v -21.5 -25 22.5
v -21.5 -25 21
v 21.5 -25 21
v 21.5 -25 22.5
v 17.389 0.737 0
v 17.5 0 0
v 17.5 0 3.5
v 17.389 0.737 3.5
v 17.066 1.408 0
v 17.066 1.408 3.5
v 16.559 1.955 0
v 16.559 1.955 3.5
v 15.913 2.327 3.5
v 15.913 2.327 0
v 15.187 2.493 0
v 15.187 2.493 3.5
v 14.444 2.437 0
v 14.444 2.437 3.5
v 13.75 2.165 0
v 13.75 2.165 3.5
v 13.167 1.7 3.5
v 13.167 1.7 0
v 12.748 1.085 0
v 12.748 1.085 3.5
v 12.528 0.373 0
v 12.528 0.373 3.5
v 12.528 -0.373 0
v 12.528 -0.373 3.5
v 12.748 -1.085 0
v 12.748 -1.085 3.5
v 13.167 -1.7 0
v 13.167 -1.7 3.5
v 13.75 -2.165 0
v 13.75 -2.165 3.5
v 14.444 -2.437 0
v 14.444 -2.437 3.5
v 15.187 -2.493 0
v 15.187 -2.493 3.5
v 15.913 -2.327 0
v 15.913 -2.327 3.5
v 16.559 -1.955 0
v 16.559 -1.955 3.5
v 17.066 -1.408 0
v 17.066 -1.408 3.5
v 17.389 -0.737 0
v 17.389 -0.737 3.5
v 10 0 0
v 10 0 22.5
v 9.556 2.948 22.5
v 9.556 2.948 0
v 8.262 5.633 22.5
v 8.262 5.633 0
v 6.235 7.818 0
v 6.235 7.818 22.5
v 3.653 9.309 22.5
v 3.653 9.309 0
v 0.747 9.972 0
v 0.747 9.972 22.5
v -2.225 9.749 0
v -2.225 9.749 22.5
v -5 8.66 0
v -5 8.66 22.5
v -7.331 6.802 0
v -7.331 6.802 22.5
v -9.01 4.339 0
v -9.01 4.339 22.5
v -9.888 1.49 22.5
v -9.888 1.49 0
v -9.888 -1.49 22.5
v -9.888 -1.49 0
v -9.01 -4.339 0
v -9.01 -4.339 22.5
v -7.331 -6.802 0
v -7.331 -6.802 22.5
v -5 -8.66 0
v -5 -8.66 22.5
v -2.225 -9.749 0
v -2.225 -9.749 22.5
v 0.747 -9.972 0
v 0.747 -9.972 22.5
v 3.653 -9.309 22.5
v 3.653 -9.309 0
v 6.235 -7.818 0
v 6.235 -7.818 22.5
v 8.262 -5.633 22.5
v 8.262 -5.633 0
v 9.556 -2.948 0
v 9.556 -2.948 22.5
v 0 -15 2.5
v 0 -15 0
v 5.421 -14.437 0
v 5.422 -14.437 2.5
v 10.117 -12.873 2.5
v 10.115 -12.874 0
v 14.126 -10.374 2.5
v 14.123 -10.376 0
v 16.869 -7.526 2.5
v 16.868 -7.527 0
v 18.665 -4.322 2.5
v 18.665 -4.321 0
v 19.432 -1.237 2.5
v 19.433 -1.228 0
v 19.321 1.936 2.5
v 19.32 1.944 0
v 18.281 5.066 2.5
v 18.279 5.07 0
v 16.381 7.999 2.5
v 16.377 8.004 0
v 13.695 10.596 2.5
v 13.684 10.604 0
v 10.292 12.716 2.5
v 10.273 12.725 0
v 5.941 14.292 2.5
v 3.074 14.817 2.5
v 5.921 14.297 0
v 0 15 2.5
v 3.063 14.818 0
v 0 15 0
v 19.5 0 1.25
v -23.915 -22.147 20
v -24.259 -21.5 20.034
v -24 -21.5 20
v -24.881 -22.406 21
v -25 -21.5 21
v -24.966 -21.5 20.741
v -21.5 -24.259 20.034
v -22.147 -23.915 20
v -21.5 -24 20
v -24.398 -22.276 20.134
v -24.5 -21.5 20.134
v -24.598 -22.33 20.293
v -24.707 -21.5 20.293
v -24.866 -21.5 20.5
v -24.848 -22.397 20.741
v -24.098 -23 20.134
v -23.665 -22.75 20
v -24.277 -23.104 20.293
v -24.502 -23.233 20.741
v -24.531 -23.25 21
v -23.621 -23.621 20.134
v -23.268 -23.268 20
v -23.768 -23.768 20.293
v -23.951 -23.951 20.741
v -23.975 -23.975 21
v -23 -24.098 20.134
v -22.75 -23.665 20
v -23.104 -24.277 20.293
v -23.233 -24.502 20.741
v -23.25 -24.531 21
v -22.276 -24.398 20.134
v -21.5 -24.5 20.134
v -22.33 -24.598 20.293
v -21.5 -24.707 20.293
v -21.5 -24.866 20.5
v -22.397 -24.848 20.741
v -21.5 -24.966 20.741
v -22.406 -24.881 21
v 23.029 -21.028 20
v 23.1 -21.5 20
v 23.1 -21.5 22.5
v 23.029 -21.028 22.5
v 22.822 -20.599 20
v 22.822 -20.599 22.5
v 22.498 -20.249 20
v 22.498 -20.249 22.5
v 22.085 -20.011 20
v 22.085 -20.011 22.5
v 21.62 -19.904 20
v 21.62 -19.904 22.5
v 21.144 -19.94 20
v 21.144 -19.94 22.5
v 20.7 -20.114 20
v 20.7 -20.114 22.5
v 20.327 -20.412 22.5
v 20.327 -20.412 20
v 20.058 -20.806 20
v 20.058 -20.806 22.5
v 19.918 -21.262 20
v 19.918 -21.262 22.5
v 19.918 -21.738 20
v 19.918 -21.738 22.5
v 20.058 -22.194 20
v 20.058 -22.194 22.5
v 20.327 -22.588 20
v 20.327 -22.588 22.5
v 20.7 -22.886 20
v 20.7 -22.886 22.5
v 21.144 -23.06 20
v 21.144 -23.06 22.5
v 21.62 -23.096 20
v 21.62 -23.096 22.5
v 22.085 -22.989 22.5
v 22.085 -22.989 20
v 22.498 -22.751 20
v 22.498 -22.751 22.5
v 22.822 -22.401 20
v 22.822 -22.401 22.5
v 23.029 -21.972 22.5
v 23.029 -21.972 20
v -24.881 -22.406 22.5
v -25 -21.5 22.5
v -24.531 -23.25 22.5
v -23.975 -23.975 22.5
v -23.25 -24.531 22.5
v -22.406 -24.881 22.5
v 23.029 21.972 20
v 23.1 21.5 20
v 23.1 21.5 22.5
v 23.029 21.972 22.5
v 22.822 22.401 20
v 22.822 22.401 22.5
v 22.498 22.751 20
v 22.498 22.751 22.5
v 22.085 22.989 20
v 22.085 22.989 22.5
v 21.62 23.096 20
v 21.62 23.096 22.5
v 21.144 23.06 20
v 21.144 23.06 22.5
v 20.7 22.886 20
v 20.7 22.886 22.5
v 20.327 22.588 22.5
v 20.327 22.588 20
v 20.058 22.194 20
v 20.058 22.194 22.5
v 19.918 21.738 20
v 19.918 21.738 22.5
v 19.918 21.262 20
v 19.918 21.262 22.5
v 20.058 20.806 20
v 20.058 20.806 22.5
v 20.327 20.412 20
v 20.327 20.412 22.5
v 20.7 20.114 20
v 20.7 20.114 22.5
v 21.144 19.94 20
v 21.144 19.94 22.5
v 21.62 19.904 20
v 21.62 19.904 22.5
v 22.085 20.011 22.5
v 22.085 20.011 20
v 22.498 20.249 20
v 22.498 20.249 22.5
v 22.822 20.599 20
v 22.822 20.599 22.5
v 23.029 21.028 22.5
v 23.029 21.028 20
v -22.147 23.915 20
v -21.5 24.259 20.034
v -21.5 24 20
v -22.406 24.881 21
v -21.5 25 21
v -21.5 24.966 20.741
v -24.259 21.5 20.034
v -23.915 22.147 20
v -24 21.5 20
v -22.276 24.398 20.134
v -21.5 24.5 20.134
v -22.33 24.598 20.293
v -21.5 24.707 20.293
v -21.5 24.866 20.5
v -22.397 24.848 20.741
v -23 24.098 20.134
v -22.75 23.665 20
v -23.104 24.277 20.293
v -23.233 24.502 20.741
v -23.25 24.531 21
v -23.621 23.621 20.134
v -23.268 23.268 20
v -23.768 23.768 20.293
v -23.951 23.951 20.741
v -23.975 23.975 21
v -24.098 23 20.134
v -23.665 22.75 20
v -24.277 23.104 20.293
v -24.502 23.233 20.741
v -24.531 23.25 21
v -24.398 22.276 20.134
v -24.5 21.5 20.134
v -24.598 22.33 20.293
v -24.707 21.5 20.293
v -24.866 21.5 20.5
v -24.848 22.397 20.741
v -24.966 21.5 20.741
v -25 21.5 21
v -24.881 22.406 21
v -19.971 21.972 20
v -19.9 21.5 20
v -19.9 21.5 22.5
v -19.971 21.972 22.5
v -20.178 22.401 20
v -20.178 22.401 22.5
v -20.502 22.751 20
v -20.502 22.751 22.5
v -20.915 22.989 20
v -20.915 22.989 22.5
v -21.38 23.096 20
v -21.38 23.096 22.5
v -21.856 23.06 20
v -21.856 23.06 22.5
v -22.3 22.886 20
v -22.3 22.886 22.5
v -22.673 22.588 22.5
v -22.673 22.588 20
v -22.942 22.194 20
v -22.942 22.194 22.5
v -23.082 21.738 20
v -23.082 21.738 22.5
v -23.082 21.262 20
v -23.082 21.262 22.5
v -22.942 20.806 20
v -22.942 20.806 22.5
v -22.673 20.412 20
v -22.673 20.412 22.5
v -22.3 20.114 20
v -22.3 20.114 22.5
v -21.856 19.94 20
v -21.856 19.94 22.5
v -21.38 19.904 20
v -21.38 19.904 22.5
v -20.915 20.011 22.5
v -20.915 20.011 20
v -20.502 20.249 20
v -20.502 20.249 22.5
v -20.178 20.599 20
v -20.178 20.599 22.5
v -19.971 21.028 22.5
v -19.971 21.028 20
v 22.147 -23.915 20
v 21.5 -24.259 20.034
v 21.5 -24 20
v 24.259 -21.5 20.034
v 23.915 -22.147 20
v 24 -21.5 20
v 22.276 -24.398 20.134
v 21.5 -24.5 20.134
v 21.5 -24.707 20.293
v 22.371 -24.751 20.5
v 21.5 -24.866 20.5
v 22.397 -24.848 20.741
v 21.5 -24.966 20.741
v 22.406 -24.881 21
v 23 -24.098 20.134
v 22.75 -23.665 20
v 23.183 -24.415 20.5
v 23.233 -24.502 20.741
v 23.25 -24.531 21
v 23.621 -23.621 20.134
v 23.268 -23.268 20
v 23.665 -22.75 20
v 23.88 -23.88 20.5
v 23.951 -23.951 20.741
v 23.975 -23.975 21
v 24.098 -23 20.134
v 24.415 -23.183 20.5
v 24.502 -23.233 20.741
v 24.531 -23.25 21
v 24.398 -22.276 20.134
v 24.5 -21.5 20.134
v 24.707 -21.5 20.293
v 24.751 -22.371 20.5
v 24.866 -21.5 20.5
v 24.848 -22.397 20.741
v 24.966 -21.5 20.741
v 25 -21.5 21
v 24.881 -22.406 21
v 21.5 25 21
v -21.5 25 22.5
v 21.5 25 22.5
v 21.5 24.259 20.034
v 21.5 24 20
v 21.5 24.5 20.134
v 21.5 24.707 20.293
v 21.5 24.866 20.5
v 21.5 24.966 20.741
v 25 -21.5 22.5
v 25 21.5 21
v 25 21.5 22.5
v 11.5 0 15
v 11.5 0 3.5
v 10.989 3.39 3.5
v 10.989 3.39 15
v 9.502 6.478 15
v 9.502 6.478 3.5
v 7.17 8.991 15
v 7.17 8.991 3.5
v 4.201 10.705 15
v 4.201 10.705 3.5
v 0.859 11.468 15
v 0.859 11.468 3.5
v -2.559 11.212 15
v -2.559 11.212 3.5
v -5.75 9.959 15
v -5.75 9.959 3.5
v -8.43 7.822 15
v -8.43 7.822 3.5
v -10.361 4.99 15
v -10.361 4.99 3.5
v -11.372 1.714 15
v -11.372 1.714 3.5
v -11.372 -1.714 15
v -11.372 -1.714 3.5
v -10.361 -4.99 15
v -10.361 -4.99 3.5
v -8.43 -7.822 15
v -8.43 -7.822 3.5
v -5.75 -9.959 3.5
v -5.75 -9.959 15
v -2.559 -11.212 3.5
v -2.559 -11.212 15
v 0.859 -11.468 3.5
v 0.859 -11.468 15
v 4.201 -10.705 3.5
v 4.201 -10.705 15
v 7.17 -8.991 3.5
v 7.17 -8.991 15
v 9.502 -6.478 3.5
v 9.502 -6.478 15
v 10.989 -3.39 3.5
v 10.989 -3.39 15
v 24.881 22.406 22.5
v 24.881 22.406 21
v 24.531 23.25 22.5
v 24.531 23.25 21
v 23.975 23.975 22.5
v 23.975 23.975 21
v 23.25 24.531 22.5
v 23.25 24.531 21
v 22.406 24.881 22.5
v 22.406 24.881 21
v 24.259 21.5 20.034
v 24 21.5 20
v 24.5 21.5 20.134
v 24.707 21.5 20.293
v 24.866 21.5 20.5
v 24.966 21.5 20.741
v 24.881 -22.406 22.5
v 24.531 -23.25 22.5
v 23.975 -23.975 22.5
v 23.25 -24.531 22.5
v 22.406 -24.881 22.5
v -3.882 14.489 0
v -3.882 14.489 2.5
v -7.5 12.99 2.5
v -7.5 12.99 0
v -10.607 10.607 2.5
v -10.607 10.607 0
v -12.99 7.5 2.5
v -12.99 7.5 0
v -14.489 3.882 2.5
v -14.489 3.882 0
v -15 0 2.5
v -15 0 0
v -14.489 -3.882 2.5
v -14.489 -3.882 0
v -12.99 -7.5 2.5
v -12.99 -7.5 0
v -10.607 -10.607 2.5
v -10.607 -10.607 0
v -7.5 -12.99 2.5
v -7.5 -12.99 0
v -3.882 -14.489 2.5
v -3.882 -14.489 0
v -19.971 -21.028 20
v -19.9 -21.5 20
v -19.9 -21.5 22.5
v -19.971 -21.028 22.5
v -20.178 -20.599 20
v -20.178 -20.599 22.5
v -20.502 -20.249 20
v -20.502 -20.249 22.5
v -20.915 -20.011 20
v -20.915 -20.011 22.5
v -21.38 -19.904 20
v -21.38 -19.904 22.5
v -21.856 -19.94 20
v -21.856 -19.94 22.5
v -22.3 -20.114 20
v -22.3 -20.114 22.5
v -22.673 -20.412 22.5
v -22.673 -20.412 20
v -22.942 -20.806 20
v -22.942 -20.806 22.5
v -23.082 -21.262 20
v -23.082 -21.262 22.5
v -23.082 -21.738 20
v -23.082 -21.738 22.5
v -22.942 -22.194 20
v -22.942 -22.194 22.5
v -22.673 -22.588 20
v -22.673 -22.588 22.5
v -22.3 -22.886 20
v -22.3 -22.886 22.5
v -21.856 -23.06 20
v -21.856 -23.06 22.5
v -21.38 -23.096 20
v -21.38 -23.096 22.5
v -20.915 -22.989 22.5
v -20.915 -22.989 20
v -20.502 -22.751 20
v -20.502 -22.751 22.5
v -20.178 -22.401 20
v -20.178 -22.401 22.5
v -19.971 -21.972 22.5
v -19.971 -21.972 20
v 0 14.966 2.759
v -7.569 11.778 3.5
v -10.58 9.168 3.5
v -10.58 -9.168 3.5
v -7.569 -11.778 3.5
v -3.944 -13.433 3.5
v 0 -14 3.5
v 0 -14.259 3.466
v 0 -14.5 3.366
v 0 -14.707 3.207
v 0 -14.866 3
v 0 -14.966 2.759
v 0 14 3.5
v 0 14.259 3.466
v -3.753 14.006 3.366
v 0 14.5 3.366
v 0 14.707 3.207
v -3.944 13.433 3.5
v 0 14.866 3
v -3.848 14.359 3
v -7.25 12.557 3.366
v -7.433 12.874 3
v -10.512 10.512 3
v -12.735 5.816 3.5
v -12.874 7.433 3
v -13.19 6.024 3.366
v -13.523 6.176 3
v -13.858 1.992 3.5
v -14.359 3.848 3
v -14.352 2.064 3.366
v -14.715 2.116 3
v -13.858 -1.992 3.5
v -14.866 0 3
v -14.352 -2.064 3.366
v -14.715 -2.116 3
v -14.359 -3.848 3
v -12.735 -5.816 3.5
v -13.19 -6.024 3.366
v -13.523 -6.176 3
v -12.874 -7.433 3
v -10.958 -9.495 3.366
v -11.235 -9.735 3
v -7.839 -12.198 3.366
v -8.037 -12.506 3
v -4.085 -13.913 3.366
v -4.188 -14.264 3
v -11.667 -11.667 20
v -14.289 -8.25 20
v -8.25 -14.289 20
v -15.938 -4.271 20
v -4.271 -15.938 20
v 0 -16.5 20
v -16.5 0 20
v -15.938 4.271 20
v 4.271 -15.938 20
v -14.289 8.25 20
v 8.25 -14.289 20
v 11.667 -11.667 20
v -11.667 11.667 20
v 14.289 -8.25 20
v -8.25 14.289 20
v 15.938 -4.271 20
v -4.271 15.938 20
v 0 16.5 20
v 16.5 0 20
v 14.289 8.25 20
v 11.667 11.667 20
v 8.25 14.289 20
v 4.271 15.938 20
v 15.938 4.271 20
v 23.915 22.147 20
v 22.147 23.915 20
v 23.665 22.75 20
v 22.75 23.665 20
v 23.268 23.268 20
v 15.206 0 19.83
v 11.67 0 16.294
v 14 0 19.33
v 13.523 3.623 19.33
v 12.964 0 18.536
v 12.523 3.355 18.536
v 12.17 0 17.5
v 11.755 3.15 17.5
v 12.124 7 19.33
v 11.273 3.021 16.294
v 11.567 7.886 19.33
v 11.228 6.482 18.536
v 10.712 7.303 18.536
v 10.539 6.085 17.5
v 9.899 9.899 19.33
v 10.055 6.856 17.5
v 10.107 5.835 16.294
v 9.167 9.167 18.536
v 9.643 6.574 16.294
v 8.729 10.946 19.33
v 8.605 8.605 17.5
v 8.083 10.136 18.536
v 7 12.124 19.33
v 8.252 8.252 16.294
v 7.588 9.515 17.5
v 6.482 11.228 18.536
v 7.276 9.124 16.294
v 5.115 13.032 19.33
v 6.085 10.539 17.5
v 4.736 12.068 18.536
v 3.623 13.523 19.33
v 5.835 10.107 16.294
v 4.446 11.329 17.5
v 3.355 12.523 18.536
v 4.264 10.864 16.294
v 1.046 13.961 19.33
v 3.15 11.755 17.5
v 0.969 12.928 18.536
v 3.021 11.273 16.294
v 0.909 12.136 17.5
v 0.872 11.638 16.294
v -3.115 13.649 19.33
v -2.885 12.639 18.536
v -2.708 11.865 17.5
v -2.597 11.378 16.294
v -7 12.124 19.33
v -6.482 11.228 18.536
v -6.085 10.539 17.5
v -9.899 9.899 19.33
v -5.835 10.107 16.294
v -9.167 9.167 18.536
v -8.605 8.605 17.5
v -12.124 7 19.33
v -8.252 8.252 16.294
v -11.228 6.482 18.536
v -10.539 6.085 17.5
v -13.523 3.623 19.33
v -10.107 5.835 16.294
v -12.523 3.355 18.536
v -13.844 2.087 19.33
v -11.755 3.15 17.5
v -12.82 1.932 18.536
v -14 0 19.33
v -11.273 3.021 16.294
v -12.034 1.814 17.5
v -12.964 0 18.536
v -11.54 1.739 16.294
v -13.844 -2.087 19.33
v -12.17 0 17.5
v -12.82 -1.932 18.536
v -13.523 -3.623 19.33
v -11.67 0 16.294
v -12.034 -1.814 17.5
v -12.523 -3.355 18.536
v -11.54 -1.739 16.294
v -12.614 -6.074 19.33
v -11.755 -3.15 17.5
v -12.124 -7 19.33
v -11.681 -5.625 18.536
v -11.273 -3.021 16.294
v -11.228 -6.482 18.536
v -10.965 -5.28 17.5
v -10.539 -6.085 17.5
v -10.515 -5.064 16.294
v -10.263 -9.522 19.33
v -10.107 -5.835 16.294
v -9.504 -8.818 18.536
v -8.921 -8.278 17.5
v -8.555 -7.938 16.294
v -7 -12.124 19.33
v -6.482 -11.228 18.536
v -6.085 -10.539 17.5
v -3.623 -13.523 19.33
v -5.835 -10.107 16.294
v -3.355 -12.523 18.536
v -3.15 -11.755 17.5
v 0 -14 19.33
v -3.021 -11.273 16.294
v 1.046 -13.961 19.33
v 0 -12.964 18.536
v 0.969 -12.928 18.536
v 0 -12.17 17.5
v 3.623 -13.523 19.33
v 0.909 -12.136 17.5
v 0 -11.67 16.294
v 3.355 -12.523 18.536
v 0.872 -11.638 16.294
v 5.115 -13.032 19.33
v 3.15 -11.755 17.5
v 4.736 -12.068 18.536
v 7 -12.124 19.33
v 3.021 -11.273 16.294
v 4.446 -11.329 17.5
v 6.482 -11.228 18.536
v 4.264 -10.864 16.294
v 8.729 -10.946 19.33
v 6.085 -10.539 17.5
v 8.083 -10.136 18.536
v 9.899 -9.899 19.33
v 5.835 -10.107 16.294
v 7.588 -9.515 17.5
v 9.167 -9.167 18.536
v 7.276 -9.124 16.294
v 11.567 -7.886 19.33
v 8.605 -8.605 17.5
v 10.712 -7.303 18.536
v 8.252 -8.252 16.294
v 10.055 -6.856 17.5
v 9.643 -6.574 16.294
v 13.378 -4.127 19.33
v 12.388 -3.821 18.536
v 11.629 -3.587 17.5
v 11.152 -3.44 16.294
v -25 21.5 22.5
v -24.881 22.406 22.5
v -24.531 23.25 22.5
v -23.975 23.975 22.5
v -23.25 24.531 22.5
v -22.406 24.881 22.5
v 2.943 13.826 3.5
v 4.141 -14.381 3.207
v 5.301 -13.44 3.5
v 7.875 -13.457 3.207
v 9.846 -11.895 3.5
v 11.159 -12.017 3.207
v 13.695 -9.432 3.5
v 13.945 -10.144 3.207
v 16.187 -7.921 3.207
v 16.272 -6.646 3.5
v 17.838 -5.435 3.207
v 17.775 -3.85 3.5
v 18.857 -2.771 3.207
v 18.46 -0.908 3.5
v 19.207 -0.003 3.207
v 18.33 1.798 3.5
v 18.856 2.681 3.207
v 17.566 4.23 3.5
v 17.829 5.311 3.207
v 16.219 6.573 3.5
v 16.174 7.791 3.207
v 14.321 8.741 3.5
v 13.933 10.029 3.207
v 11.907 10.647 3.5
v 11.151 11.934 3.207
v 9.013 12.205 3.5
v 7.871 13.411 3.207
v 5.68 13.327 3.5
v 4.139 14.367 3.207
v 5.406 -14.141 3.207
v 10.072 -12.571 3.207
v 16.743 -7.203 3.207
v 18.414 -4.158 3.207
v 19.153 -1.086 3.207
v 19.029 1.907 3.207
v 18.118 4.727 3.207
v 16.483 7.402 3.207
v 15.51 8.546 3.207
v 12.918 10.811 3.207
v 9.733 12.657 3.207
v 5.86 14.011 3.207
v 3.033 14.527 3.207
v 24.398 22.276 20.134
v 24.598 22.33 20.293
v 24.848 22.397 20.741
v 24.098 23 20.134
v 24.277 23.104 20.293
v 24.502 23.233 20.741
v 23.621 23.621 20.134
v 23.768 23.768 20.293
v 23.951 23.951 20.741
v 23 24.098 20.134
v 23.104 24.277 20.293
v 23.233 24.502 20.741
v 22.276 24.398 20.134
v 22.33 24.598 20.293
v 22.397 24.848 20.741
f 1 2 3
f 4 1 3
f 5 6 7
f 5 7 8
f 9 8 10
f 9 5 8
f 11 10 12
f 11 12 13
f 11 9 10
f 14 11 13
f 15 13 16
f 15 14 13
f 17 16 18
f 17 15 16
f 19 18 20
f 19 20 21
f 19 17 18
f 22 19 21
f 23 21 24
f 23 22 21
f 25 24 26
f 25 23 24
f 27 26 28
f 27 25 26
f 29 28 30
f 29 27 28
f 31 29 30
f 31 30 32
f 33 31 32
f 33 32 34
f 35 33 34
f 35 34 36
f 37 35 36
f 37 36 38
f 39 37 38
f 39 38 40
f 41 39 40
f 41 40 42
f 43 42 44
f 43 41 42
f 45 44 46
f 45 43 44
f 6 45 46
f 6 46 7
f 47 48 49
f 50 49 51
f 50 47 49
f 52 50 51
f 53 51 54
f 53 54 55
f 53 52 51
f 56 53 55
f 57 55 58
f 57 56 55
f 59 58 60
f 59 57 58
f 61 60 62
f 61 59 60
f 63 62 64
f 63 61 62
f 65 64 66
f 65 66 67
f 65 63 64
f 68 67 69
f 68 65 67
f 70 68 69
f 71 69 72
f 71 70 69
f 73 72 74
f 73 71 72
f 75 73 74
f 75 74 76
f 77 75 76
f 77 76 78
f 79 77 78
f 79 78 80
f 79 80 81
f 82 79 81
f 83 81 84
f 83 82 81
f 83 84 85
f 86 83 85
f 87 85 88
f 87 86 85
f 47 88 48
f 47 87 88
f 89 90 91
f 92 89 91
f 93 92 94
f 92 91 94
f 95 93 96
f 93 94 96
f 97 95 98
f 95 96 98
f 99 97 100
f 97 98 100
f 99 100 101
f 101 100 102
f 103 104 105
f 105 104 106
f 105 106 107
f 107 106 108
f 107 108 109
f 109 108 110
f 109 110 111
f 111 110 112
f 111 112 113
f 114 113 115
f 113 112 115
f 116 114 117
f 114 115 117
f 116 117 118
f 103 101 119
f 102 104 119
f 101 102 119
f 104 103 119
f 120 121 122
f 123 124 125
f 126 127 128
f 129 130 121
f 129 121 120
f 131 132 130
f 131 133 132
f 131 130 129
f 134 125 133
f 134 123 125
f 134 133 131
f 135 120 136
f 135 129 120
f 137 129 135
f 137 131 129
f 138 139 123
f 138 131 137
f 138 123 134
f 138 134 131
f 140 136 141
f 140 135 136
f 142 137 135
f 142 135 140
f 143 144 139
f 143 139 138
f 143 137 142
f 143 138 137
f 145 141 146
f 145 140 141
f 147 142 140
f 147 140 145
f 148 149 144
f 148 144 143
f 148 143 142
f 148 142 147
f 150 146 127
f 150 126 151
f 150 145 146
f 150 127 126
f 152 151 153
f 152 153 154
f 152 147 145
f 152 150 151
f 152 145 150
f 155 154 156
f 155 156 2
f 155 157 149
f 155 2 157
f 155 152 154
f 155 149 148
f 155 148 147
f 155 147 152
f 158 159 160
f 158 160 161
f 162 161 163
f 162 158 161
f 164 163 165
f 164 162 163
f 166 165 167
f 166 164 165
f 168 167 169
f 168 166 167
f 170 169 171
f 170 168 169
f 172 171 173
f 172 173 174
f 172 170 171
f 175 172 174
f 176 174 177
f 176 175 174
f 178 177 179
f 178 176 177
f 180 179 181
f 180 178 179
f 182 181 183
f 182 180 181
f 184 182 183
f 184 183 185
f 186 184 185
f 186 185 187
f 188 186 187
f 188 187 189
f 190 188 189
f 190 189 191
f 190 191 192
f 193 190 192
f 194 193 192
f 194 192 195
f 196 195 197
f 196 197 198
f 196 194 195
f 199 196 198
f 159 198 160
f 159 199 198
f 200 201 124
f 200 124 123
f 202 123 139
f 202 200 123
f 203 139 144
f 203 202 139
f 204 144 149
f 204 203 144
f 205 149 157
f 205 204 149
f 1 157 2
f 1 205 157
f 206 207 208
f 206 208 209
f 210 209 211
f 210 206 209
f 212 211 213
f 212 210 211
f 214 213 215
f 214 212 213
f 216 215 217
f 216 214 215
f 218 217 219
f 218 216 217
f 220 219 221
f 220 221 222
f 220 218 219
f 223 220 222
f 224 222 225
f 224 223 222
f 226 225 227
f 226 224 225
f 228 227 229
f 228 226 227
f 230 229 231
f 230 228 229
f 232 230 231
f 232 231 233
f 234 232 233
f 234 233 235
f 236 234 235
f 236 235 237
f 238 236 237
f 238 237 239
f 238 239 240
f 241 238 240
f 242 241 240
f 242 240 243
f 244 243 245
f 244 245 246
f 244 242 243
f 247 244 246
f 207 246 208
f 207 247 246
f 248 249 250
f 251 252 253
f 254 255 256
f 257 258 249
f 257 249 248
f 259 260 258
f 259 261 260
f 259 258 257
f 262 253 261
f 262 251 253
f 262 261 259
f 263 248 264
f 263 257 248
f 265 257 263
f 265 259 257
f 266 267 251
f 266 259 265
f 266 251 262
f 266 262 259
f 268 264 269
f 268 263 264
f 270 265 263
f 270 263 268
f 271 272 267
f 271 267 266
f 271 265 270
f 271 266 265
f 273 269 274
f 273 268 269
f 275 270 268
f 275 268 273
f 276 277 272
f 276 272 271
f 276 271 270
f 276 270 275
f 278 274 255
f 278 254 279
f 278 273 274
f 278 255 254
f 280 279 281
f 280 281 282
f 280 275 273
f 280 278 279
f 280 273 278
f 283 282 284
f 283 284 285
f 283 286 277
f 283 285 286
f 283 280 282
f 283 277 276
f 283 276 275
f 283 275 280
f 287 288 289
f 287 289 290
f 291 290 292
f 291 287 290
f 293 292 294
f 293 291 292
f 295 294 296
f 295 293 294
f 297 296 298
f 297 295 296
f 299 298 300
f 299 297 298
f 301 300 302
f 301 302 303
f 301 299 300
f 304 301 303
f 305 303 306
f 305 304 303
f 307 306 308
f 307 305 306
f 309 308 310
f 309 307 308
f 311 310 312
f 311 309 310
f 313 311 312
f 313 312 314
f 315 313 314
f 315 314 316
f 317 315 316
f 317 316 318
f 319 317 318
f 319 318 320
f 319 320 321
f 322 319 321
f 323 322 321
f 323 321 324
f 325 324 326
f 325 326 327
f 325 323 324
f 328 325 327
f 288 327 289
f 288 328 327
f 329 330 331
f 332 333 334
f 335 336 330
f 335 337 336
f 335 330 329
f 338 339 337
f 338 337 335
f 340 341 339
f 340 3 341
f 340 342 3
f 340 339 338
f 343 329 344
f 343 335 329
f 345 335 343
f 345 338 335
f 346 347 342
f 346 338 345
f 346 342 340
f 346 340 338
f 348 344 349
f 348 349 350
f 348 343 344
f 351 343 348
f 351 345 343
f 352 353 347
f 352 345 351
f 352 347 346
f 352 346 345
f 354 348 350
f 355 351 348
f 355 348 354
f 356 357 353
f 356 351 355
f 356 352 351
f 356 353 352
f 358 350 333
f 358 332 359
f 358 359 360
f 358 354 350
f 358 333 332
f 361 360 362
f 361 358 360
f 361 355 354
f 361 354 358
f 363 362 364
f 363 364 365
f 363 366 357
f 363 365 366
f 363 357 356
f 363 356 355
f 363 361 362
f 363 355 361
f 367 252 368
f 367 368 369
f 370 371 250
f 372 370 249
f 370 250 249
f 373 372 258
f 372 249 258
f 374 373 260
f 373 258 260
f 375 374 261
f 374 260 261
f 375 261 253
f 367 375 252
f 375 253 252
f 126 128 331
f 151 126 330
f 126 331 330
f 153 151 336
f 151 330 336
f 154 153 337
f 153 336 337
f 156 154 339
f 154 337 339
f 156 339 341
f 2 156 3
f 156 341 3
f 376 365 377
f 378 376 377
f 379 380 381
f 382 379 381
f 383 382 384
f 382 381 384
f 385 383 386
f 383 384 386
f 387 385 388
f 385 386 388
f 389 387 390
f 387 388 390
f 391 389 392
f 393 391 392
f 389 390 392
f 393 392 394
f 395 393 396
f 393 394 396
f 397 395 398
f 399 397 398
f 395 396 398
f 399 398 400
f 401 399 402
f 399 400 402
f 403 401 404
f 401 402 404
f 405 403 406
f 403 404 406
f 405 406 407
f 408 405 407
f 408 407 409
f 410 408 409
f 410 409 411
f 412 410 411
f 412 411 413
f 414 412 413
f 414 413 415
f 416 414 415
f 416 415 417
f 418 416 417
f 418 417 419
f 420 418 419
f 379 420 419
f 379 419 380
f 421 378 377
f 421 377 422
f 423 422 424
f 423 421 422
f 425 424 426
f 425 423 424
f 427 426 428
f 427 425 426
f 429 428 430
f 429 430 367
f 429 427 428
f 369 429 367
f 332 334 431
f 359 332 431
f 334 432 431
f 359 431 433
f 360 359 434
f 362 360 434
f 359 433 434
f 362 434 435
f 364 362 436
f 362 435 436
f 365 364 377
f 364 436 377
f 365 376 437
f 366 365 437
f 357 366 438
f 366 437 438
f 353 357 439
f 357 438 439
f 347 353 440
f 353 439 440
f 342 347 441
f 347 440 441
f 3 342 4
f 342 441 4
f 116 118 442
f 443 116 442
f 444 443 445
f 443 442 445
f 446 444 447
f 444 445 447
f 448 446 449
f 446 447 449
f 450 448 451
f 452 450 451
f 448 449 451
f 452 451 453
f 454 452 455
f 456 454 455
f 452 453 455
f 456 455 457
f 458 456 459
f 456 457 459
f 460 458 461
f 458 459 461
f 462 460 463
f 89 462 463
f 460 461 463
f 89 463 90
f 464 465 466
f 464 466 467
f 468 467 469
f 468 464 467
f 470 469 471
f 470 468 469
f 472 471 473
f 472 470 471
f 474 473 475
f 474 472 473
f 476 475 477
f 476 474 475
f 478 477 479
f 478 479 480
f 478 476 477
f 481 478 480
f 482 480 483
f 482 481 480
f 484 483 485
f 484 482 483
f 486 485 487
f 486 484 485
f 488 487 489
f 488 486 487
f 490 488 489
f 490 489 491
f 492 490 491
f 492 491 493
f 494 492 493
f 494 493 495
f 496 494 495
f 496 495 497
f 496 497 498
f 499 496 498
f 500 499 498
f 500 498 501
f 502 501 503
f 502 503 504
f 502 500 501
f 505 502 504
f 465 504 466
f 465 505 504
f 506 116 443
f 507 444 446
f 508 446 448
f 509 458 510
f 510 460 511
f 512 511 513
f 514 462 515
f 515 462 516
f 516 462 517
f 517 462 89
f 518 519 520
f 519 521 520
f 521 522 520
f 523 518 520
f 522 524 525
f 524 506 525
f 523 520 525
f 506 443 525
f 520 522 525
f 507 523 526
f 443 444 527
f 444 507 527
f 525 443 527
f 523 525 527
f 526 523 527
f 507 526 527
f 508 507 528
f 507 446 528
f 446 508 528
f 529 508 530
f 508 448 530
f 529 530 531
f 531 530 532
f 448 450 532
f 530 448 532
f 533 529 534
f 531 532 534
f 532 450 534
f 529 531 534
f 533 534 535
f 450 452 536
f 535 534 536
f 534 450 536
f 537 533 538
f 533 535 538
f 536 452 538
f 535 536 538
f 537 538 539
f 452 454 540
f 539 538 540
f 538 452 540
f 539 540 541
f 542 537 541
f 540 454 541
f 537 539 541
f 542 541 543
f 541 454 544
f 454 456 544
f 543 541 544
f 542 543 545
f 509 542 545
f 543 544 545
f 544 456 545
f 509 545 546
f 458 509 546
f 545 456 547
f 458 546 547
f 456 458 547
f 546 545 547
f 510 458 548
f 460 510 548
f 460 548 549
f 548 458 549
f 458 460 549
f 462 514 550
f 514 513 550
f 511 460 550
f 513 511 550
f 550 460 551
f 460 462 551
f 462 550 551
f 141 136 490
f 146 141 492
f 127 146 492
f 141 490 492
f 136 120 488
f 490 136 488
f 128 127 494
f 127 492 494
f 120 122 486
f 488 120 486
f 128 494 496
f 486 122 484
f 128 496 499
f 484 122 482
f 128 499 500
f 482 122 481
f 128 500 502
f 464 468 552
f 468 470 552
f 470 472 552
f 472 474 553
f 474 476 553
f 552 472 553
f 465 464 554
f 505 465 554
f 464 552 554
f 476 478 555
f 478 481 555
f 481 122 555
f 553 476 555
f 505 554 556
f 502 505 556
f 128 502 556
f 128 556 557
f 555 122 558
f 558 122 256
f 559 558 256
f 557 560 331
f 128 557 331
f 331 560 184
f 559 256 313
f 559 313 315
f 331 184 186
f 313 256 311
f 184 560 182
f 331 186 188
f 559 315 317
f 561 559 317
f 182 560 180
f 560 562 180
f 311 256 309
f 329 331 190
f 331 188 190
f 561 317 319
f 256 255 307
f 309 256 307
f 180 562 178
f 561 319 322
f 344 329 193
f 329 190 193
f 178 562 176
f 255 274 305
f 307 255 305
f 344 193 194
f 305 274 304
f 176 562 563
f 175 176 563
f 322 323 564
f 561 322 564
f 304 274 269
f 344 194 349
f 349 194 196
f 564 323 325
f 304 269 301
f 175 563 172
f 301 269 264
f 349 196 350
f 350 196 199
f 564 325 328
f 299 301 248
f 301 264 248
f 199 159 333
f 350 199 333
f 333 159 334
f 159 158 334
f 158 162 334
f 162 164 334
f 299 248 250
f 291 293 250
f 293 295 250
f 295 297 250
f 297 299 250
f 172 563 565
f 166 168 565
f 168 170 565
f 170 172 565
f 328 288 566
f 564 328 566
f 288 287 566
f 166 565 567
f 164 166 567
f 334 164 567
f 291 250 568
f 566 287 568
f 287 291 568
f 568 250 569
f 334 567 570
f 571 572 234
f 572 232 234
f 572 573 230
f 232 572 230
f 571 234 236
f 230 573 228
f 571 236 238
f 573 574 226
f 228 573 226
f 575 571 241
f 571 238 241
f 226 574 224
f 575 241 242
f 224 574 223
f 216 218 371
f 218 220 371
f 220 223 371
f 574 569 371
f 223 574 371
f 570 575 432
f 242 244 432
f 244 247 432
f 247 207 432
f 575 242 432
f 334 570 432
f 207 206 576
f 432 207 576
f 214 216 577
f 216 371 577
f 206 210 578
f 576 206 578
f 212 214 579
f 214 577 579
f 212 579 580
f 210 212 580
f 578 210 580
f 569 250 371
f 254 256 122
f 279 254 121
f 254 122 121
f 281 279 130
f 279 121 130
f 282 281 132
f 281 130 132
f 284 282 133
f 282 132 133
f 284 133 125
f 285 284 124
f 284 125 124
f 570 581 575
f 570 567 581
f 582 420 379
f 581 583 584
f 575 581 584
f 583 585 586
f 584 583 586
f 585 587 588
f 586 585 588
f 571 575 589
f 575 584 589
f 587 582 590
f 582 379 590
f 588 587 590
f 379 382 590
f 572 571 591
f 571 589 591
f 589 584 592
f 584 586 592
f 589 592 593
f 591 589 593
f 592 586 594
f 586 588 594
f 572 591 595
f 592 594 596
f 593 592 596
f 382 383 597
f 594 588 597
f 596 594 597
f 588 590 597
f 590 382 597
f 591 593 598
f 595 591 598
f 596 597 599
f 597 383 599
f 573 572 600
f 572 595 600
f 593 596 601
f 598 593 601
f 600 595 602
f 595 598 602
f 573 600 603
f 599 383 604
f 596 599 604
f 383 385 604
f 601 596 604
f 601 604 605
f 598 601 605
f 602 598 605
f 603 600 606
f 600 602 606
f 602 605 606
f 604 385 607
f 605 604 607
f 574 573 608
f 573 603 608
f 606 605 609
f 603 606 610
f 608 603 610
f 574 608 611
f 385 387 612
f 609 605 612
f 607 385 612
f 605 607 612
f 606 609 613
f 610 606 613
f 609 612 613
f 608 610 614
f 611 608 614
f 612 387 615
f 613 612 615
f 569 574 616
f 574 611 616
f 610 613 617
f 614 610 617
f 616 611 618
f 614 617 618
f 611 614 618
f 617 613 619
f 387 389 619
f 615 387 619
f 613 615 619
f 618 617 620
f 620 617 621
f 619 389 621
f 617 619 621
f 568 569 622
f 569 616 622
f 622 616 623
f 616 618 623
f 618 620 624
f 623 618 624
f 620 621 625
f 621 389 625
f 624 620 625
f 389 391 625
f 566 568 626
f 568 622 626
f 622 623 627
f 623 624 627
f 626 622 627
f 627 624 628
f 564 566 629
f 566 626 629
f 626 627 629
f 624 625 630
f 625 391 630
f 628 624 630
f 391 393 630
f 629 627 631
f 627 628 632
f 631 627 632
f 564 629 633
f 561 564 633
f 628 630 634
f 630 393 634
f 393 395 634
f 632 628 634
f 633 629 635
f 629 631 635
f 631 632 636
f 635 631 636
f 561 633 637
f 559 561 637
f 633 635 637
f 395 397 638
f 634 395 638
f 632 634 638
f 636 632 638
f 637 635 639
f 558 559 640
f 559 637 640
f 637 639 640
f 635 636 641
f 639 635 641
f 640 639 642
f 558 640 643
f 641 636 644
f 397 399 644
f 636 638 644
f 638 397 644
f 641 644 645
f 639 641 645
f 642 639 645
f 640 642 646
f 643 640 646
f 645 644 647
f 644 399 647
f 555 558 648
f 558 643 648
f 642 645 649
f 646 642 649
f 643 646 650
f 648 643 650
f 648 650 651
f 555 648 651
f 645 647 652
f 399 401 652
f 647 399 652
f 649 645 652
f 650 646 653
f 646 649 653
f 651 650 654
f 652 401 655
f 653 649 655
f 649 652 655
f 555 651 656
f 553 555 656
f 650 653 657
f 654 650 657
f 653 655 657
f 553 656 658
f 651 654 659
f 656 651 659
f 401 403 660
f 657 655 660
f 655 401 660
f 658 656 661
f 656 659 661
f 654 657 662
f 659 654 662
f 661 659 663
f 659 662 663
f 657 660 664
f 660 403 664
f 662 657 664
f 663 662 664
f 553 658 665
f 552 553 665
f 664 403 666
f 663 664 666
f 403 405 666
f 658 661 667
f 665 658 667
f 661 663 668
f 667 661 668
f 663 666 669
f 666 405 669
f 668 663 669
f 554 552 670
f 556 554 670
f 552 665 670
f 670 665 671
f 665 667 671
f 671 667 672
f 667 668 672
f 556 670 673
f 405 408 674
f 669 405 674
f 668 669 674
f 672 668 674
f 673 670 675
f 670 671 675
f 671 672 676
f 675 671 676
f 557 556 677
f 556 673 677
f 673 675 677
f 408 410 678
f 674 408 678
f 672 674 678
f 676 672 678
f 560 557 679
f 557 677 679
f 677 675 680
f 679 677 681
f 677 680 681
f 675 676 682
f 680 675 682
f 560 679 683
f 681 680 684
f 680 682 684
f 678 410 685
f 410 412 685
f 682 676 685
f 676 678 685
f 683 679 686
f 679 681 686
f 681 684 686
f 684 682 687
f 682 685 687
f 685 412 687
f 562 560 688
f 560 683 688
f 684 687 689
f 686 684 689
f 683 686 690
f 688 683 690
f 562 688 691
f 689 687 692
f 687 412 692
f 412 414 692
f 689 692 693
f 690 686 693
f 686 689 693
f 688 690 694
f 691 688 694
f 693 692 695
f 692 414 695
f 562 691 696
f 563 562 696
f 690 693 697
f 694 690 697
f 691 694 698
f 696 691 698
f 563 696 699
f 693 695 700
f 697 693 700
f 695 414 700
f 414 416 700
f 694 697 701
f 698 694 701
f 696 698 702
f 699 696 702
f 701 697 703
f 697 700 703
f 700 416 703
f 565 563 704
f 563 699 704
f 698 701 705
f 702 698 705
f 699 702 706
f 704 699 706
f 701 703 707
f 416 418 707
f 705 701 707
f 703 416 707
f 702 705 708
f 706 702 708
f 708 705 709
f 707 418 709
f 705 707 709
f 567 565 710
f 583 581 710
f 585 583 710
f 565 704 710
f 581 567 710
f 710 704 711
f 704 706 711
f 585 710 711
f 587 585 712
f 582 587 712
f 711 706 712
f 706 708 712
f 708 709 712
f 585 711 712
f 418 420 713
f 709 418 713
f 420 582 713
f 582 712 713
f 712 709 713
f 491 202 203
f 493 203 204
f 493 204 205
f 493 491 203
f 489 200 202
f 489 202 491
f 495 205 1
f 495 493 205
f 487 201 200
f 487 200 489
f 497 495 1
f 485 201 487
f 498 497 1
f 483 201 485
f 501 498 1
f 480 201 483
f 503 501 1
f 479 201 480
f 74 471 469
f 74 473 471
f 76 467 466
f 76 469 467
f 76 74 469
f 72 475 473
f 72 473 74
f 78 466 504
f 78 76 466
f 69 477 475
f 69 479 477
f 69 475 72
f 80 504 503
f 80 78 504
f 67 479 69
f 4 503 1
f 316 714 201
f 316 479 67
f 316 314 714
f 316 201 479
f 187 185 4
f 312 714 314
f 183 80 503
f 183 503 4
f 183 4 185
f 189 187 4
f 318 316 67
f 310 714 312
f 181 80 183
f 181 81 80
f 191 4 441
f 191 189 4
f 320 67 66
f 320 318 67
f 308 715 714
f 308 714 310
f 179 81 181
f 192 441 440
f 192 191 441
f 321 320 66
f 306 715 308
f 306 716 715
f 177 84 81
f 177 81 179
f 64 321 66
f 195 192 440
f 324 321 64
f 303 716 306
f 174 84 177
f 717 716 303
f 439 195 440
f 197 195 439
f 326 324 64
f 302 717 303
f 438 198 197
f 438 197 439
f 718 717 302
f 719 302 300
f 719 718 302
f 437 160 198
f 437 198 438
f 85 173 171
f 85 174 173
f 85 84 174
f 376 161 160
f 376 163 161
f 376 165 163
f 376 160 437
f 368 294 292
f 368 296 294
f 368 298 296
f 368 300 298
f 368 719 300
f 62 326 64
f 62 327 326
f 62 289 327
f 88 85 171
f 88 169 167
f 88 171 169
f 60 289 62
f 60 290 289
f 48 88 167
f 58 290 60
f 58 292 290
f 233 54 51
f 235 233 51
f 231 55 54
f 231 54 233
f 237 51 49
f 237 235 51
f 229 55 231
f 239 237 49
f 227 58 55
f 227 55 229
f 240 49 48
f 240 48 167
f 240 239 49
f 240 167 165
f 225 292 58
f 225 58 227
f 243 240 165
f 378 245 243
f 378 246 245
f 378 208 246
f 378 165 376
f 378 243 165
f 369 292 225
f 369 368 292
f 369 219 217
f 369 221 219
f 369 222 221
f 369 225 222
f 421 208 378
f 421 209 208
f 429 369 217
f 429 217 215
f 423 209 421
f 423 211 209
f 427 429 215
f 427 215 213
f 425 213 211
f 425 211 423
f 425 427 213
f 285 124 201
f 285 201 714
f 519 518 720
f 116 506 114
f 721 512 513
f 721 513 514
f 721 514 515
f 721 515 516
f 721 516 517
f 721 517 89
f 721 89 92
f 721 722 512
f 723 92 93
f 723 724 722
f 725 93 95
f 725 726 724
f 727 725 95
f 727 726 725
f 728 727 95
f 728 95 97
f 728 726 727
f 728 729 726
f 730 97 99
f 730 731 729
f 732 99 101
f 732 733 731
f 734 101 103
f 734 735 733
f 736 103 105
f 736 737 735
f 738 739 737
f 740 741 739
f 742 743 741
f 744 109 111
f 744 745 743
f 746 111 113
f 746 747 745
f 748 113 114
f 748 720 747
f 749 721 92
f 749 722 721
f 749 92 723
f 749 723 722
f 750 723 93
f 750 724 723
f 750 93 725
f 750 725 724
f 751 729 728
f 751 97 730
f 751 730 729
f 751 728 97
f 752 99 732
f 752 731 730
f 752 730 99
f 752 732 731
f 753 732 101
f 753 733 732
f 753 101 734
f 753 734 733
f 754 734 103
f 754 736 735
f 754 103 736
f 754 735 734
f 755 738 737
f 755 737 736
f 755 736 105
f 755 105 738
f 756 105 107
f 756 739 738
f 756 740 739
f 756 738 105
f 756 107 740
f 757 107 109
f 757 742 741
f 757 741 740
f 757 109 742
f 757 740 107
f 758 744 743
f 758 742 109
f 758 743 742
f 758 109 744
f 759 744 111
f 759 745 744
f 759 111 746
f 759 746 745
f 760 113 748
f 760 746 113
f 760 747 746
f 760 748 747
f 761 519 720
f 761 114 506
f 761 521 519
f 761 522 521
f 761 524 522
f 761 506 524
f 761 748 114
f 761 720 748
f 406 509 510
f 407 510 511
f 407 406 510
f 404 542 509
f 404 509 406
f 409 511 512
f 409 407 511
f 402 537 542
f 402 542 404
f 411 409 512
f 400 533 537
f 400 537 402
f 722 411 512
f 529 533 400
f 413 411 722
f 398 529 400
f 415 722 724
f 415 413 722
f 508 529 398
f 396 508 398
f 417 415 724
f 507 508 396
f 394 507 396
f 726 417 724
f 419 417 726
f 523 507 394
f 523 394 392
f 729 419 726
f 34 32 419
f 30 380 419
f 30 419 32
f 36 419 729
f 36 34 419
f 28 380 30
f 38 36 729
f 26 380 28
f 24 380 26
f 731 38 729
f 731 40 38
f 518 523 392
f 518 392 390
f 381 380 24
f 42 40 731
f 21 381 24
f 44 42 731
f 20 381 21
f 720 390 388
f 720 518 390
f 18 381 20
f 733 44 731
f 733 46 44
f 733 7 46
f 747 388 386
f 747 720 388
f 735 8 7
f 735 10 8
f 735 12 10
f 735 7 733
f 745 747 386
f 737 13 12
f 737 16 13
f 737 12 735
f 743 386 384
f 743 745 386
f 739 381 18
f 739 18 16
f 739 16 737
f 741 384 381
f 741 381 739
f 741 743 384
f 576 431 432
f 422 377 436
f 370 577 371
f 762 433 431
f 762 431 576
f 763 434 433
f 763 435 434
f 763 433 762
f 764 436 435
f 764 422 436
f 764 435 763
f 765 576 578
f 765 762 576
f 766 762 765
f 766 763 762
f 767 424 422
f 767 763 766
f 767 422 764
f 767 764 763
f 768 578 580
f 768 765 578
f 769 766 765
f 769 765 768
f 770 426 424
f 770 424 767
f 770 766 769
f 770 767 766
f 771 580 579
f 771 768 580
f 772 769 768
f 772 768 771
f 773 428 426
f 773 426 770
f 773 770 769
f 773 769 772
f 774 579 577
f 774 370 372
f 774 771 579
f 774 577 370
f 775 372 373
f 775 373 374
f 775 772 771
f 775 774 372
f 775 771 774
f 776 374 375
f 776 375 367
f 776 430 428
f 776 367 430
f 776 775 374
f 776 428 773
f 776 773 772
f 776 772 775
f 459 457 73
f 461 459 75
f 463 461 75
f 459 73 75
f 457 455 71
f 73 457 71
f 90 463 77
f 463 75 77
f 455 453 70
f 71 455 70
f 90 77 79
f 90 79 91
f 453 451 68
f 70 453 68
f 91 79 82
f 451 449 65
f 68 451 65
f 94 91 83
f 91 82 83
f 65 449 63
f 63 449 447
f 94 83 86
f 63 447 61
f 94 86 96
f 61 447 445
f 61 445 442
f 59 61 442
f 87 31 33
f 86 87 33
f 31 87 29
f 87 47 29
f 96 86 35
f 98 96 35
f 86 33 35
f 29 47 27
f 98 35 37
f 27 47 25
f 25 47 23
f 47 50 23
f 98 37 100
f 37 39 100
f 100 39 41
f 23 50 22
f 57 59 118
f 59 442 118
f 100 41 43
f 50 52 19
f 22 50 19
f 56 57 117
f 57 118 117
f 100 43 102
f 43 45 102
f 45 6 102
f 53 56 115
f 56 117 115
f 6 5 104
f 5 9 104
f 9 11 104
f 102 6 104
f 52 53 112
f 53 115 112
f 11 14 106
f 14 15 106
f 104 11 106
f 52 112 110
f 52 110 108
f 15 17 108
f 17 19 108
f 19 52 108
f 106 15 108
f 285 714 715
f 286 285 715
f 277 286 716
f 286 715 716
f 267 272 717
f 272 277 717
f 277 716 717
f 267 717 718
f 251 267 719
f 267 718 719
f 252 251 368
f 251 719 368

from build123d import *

# Parameters (mm, degrees)
BOSS_EXTRUDE1_OUTLINE_R   = 10
BOSS_EXTRUDE1_OUTLINE_R_2 = 2.5
BOSS_EXTRUDE1_DEPTH       = 3.5
SKETCH1_3_R               = 11.5
SKETCH1_3_R_2             = 10
BOSS_EXTRUDE2_DEPTH       = 20
SKETCH2_W                 = 50
SKETCH2_H                 = 50
SKETCH2_R                 = 1.6
SKETCH2_R_2               = 11.5
SKETCH2_R_3               = 10
BOSS_EXTRUDE3_DEPTH       = 2.5
FILLET1_R                 = 3.5
FILLET2_R                 = 5
FILLET3_R                 = 1


# Read off the part's stored shape, not the designer's step: Boss-Extrude1
with BuildPart() as part:
    # Boss-Extrude1 outline → Boss-Extrude1 (new body)
    with BuildSketch(Plane.XY):
        with BuildLine():
            ThreePointArc((0, 15), (-15, 0), (0, -15))
            add(Edge.make_bspline(
                [(0, -15), (11.666666667, -15), (19.5, -7.666459565), (19.5, 7.333540435), (11.666666667, 15), (0, 15)],
                knots=[0, 0, 0, 0, 0.511097304, 0.511097304, 1, 1, 1, 1], degree=3))
        make_face()
        Circle(BOSS_EXTRUDE1_OUTLINE_R, mode=Mode.SUBTRACT)
        with Locations((15, 0)):
            Circle(BOSS_EXTRUDE1_OUTLINE_R_2, mode=Mode.SUBTRACT)
    extrude(amount=BOSS_EXTRUDE1_DEPTH)

    # Sketch1<3> → Boss-Extrude2 (add)
    with BuildSketch(Plane.XY):
        Circle(SKETCH1_3_R)
        Circle(SKETCH1_3_R_2, mode=Mode.SUBTRACT)
    extrude(amount=BOSS_EXTRUDE2_DEPTH)

    # Sketch2 → Boss-Extrude3 (add)
    # profile 1 of 2: a face of its own
    with BuildSketch(Plane.XY.offset(20)):
        Rectangle(SKETCH2_W, SKETCH2_H)
        with Locations((21.5, 21.5)):
            Circle(SKETCH2_R, mode=Mode.SUBTRACT)
        with Locations((21.5, -21.5)):
            Circle(SKETCH2_R, mode=Mode.SUBTRACT)
        with Locations((-21.5, -21.5)):
            Circle(SKETCH2_R, mode=Mode.SUBTRACT)
        with Locations((-21.5, 21.5)):
            Circle(SKETCH2_R, mode=Mode.SUBTRACT)
        Circle(SKETCH2_R_2, mode=Mode.SUBTRACT)
    # profile 2 of 2: a face of its own
    with BuildSketch(Plane.XY.offset(20)):
        Circle(SKETCH2_R_2)
        Circle(SKETCH2_R_3, mode=Mode.SUBTRACT)
    extrude(amount=BOSS_EXTRUDE3_DEPTH)

    # Fillet1
    fillet1_edges = [part.edges().sort_by_distance(p)[0] for p in [
        (25, -25, 21.25),
        (25, 25, 21.25),
        (-25, 25, 21.25),
        (-25, -25, 21.25),
    ]]
    fillet(fillet1_edges, radius=FILLET1_R)

    # Fillet2
    fillet2_edges = [part.edges().sort_by_distance(p)[0] for p in [
        (-11.5, 0, 20),
    ]]
    fillet(fillet2_edges, radius=FILLET2_R)

    # Fillet3
    fillet3_edges = [part.edges().sort_by_distance(p)[0] for p in [
        (-15, 0, 3.5),
        (25, 0, 20),
        (0, -25, 20),
        (-25, 0, 20),
        (0, 25, 20),
        (23.974873734, 23.974873734, 20),
        (-23.974873734, 23.974873734, 20),
        (-23.974873734, -23.974873734, 20),
        (23.974873734, -23.974873734, 20),
        (10, 0, 11.25),
    ]]
    fillet(fillet3_edges, radius=FILLET3_R)


solid = part.part
